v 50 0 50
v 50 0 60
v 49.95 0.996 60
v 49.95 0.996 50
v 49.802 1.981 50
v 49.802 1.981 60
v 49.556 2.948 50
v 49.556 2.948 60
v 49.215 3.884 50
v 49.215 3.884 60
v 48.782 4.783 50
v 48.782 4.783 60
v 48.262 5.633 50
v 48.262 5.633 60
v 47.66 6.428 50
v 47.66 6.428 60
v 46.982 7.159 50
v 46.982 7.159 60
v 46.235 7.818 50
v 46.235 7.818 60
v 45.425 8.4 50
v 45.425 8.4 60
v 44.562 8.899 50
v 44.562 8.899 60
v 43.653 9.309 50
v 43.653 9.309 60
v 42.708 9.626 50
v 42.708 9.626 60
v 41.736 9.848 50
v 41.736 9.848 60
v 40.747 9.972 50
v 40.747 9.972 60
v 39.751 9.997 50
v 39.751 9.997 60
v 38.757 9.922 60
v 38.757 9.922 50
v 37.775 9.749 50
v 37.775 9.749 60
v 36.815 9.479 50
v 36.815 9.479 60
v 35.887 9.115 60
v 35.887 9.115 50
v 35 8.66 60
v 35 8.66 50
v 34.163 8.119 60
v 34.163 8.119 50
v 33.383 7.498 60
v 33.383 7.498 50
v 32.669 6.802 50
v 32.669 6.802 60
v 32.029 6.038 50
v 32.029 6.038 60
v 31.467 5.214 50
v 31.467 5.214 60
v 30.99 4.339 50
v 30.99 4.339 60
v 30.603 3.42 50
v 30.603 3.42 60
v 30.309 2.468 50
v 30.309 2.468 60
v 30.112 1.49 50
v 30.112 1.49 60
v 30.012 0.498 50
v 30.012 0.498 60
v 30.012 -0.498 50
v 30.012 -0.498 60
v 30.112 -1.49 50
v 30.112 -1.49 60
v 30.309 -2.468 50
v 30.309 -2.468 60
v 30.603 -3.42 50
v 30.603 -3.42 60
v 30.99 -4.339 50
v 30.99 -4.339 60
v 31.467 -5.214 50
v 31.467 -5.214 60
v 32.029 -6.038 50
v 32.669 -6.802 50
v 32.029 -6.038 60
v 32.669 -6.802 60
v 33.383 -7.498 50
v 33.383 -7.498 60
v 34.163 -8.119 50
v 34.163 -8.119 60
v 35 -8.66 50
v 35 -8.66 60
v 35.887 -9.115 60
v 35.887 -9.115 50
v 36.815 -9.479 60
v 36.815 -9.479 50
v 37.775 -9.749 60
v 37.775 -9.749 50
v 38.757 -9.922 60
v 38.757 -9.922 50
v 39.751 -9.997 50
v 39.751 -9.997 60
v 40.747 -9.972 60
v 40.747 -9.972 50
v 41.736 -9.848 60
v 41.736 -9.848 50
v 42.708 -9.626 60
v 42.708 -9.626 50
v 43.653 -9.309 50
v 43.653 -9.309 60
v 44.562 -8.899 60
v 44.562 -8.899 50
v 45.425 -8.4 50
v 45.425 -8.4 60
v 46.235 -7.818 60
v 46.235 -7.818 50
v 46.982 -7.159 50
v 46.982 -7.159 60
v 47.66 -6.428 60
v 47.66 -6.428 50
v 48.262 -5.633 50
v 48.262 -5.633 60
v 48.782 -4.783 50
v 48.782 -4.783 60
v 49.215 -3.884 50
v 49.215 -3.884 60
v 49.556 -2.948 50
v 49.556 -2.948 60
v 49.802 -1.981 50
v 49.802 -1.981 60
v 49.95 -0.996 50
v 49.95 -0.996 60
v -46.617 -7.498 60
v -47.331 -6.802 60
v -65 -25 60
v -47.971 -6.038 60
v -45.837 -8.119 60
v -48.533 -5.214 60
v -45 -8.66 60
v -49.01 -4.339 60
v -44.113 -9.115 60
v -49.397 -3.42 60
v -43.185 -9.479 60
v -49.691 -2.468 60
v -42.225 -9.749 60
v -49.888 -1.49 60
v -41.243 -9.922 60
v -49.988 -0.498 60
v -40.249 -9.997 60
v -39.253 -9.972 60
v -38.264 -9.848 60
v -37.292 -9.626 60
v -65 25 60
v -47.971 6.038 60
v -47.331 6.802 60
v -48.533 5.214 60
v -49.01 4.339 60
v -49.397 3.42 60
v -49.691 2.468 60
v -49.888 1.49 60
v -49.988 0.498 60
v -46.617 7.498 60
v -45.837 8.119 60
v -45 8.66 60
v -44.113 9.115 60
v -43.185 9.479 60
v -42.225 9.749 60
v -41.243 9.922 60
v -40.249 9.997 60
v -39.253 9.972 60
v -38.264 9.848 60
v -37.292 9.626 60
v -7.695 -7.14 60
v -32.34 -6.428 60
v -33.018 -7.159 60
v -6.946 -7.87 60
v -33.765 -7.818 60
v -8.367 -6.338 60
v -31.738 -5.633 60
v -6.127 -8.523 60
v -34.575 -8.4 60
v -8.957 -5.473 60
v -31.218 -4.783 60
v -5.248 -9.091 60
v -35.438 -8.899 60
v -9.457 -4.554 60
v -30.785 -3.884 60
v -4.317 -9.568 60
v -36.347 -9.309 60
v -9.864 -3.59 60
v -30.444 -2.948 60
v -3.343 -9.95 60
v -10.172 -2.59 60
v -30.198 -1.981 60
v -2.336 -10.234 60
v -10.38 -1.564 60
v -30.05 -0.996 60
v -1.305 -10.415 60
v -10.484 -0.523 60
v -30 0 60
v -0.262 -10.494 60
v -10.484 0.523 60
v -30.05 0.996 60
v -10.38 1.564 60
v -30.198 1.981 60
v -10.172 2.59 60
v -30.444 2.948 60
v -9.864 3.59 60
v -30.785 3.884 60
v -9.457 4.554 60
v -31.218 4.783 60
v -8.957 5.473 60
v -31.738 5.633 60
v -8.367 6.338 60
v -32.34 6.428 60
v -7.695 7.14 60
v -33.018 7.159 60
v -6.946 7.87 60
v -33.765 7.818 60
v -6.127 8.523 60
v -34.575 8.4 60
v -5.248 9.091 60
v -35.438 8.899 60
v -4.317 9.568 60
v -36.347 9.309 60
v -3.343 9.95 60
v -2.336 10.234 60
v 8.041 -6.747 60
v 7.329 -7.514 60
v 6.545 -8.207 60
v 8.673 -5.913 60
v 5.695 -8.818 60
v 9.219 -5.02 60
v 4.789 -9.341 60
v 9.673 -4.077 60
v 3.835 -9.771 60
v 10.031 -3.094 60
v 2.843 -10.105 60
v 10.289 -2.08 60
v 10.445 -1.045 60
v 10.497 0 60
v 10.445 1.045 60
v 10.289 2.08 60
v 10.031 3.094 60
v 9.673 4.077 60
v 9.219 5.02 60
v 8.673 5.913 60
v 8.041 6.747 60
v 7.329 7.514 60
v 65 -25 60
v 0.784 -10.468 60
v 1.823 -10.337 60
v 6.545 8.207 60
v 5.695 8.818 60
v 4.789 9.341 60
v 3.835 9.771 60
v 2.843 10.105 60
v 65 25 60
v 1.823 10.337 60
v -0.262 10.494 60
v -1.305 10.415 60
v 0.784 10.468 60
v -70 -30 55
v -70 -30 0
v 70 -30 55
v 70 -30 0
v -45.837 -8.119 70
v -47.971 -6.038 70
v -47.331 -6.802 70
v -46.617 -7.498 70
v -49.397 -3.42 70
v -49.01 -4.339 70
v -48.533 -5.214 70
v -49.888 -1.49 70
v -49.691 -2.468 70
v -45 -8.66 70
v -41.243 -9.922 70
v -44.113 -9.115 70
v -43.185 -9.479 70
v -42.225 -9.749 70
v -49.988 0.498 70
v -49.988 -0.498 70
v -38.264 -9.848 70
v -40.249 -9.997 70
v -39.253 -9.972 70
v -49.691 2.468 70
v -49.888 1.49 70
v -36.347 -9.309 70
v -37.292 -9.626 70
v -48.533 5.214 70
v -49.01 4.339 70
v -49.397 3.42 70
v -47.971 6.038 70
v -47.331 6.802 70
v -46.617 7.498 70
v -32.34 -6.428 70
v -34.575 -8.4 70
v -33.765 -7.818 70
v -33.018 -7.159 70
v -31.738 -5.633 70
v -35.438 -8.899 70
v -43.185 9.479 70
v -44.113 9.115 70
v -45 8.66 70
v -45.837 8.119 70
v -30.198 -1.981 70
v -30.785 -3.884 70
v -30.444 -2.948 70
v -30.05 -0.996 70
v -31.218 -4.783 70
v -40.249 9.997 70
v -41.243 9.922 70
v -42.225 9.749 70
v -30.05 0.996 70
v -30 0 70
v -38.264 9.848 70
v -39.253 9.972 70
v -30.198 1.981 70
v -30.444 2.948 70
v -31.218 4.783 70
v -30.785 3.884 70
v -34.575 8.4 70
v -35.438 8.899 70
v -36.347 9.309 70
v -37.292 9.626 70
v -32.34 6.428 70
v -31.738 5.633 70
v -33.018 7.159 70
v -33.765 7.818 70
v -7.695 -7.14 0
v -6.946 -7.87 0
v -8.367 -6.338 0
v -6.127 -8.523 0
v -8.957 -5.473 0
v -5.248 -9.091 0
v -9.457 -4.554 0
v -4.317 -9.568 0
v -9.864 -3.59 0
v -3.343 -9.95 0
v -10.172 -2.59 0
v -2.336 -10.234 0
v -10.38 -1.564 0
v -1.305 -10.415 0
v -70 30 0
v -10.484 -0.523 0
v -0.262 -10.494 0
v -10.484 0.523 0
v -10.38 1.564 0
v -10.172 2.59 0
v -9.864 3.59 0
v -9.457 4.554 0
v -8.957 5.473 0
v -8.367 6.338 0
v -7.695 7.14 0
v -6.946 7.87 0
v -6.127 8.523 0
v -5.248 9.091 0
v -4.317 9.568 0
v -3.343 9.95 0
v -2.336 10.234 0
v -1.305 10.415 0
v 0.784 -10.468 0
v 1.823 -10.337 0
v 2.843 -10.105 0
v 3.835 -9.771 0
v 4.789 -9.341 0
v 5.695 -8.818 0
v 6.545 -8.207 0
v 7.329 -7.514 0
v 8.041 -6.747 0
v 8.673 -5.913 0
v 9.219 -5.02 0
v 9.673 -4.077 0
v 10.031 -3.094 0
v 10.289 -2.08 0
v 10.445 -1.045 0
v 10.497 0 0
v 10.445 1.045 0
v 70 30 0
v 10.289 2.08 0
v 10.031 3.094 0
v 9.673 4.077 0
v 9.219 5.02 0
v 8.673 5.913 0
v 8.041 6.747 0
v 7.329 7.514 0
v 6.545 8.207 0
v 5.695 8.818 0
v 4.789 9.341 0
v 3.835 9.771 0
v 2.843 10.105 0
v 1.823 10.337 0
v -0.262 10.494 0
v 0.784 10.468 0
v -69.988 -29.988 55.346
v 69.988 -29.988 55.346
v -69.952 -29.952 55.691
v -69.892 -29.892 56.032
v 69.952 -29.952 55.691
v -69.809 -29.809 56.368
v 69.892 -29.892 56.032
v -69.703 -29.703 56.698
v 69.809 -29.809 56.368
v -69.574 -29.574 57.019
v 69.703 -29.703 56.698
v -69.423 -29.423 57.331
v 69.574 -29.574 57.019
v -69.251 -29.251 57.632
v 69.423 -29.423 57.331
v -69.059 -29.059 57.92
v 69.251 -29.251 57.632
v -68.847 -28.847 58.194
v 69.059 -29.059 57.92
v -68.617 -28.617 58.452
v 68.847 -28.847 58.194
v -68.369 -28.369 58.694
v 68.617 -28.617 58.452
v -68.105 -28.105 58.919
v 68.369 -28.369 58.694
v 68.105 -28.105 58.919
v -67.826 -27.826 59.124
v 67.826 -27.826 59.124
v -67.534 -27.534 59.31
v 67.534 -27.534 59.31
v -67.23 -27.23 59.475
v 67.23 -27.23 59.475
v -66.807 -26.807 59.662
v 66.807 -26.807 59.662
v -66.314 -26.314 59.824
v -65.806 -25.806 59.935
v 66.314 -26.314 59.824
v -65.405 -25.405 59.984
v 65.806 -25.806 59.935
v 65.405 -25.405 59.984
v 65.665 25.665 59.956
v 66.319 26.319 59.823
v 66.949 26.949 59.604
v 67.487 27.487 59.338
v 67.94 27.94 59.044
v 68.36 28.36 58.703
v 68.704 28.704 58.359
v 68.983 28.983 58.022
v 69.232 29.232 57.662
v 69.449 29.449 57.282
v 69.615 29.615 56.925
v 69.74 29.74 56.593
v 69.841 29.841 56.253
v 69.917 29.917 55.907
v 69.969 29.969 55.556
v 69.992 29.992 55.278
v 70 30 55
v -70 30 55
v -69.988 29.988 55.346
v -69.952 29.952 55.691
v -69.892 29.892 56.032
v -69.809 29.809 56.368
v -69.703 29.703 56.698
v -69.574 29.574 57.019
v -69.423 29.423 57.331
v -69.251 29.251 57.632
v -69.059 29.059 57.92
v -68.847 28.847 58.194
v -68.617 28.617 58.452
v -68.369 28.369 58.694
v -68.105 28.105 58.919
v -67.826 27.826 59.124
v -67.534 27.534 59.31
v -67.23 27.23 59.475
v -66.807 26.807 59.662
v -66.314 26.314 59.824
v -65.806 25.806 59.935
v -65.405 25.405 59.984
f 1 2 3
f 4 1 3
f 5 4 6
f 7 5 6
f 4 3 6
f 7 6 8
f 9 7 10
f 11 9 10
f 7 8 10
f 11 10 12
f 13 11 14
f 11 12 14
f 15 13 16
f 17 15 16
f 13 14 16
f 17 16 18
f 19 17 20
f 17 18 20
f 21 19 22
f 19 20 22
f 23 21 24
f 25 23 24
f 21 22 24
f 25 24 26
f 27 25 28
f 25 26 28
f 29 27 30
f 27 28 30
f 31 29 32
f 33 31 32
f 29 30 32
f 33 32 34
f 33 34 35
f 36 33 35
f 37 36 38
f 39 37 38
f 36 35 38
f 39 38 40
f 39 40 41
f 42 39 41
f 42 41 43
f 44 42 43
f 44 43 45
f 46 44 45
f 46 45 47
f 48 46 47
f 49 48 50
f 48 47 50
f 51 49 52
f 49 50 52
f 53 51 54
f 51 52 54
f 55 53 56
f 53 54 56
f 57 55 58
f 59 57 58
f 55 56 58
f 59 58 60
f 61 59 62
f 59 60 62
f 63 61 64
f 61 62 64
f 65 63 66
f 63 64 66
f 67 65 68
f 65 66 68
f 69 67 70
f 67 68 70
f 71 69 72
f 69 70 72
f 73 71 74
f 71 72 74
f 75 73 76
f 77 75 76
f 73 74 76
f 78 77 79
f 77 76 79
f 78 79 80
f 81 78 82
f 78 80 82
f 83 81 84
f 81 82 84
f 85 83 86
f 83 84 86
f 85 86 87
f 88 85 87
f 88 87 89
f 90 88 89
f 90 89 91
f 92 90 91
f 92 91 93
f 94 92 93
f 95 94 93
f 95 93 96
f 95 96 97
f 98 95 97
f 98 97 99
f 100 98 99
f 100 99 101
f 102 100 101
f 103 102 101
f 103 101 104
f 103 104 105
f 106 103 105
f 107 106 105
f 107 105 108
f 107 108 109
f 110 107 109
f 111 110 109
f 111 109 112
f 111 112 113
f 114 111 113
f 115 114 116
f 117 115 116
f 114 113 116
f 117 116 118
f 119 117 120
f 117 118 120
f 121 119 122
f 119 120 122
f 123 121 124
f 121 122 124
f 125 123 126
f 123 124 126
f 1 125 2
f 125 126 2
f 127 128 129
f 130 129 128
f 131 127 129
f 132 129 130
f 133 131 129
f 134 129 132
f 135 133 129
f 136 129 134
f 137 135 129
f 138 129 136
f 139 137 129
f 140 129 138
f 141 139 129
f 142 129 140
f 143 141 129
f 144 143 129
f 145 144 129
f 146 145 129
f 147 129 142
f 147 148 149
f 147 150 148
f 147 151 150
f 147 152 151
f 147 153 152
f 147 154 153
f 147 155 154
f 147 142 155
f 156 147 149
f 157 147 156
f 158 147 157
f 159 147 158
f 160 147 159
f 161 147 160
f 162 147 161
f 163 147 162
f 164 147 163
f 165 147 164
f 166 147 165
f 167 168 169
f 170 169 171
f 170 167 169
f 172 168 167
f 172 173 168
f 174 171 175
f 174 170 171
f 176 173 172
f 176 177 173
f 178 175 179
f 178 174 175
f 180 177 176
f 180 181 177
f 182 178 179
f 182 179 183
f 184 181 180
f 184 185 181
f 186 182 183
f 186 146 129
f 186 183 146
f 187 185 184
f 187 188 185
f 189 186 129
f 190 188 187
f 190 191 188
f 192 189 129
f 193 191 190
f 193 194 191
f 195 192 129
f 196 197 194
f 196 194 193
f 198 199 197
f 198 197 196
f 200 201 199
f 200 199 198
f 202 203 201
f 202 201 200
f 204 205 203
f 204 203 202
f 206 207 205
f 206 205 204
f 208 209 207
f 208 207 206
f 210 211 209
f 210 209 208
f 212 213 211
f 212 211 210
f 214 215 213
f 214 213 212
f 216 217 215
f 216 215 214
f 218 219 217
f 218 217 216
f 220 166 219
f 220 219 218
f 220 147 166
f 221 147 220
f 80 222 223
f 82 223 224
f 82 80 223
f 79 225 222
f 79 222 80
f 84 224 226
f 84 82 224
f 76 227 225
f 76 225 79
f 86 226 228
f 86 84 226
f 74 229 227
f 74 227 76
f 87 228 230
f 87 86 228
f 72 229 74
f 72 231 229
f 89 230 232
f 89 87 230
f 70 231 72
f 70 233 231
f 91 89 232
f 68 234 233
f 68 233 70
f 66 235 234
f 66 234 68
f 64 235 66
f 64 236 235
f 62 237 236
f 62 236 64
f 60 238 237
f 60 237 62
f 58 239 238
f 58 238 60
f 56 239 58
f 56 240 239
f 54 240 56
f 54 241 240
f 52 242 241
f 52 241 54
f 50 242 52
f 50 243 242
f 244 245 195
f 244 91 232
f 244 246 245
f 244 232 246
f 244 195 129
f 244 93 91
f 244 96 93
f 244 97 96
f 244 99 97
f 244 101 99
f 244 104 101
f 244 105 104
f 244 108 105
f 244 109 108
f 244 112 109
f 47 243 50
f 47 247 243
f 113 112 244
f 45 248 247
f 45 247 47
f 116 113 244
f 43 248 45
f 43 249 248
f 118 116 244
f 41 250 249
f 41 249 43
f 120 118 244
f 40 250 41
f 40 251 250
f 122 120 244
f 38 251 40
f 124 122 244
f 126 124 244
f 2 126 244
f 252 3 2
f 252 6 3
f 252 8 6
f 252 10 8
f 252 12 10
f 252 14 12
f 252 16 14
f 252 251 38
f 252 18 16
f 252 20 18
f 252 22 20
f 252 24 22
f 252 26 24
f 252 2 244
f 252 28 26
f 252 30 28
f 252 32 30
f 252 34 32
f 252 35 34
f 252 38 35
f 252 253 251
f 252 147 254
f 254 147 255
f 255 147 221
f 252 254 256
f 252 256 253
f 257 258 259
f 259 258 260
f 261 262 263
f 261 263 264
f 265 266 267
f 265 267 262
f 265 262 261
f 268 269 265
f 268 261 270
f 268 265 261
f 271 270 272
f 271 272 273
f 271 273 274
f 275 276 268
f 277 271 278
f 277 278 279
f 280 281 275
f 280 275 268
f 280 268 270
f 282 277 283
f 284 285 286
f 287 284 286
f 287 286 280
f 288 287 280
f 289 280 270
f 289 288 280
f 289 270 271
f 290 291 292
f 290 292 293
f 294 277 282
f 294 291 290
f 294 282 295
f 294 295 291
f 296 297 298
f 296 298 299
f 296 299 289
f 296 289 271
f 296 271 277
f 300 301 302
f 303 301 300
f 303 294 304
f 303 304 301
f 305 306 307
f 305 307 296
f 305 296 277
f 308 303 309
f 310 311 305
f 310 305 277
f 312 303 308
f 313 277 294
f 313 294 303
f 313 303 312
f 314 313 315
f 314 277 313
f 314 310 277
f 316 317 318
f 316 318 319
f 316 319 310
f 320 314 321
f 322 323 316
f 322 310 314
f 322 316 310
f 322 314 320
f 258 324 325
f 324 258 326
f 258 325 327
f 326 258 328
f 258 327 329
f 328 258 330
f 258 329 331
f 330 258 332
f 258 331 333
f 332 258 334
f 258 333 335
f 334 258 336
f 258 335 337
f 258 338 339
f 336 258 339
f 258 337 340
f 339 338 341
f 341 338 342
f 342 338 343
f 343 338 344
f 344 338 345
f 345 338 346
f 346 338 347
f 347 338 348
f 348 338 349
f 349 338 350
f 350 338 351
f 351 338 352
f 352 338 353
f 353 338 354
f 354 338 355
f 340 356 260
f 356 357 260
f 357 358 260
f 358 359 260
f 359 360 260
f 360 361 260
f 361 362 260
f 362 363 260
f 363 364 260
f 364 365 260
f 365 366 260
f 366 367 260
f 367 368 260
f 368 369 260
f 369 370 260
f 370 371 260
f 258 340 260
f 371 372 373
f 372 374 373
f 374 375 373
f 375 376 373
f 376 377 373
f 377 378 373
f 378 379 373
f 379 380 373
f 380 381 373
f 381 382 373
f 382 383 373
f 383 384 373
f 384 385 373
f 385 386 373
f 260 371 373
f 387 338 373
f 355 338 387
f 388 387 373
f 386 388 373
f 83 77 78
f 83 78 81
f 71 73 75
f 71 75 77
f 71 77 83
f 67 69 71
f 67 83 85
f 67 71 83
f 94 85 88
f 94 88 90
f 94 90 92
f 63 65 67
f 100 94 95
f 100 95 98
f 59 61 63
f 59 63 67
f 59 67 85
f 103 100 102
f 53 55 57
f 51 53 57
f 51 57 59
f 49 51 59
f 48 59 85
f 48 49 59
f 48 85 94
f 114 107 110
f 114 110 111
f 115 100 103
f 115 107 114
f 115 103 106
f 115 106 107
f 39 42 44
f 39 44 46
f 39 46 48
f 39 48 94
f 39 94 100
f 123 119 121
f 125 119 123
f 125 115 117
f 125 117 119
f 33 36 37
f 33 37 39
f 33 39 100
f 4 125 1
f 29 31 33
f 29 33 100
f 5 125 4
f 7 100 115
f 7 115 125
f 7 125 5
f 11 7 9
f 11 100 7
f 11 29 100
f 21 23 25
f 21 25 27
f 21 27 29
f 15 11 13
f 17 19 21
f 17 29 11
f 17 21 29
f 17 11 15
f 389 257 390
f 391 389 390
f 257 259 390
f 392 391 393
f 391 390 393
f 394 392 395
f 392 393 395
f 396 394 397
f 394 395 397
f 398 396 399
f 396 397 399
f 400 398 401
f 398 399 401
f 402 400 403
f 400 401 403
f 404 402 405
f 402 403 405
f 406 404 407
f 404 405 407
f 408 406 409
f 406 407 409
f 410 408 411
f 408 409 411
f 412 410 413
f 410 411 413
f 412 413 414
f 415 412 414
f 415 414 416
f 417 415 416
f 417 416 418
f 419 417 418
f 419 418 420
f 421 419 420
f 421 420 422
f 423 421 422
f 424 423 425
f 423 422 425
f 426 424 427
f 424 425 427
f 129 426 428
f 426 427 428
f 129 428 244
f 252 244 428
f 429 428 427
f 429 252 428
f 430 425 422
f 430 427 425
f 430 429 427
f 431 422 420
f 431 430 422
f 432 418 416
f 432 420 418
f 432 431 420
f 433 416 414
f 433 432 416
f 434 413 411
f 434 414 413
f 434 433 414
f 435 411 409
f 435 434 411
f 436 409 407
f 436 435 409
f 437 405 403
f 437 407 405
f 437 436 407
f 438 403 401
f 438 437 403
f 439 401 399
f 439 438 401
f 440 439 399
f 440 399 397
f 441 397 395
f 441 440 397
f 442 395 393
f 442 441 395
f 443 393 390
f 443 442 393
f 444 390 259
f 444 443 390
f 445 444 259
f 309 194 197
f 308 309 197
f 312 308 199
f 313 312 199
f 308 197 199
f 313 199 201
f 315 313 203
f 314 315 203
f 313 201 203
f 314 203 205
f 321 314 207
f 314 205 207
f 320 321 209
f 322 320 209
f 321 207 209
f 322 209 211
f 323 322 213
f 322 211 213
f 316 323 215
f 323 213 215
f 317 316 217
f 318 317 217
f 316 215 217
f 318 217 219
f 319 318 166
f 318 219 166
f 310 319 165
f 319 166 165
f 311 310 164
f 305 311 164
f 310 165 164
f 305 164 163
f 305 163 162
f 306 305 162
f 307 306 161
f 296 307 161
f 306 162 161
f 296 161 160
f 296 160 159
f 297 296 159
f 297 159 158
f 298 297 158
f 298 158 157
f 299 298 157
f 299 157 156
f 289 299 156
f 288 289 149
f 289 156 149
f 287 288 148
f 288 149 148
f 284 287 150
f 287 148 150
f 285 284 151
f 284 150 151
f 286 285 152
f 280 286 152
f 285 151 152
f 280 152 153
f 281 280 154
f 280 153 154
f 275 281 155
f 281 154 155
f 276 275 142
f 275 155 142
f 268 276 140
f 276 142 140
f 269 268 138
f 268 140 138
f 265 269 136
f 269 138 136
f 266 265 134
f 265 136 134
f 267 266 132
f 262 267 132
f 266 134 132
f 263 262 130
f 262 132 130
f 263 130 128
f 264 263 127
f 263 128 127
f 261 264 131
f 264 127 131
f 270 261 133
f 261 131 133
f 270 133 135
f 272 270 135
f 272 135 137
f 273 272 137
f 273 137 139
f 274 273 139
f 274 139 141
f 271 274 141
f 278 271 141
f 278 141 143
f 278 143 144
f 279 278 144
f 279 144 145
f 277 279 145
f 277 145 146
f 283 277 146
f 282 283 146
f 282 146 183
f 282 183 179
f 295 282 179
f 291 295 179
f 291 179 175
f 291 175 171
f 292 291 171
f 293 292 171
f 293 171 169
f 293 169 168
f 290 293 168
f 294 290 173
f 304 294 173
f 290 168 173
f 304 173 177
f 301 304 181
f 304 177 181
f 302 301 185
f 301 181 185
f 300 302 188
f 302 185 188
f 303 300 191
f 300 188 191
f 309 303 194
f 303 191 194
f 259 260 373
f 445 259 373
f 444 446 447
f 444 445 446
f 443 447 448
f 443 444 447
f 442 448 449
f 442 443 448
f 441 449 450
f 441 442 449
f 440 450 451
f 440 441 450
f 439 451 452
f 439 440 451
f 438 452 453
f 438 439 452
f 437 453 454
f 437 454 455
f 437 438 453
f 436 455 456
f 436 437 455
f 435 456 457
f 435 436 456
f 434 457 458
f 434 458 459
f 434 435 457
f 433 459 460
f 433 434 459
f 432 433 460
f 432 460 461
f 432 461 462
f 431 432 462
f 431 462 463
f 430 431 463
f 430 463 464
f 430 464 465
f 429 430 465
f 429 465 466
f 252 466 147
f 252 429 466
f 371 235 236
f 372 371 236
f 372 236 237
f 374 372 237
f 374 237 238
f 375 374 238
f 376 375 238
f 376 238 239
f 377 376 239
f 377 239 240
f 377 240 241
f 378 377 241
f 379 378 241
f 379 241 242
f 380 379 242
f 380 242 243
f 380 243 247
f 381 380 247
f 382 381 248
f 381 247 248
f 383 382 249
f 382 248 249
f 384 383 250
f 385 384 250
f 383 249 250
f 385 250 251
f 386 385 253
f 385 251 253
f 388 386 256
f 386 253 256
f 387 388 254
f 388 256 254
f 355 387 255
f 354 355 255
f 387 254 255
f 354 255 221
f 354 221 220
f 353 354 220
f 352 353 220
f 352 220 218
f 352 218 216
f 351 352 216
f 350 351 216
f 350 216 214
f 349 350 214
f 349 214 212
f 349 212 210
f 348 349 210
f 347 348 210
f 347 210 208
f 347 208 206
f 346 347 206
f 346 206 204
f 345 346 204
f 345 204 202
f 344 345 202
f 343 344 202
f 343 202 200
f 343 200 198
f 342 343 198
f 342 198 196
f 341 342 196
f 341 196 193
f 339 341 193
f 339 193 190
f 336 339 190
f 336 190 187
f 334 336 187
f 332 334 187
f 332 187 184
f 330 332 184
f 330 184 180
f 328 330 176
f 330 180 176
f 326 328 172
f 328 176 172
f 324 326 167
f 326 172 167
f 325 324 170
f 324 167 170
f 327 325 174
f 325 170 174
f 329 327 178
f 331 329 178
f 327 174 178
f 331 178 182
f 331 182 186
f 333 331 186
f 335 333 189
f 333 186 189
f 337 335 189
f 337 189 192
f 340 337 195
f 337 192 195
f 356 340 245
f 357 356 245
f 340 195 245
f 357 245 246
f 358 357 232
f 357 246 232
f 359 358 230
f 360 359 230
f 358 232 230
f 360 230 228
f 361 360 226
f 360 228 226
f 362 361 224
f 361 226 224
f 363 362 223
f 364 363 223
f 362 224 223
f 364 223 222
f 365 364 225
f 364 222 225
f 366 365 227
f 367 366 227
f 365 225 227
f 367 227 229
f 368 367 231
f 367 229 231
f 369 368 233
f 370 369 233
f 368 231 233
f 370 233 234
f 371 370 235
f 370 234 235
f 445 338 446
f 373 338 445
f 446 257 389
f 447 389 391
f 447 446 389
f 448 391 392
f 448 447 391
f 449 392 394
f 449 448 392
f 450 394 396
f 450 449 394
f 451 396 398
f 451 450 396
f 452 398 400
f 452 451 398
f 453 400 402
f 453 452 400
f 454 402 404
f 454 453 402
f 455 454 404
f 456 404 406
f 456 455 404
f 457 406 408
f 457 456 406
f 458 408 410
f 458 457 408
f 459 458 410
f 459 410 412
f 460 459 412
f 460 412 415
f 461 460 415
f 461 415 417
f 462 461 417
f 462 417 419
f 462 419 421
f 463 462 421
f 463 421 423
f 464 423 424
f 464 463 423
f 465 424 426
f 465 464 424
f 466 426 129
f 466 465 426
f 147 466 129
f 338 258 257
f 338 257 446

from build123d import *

# Parameters (mm, degrees)
F0_W     = 140
F0_H     = 60
F1_DEPTH = 60
F2_R     = 10
F5_DEPTH = 10
F4_R     = 10.496877
F6_DEPTH = 69.2
F3_R     = 10
F7_DEPTH = 10
F8_R     = 5


with BuildPart() as f1:
    # F0 (on Top) → F1 (new body)
    with BuildSketch(Plane.XY):
        Rectangle(F0_W, F0_H)
    extrude(amount=F1_DEPTH)

    # F2 (on face) → F5 (join)
    with BuildSketch(Plane.XY.offset(60)):
        with Locations((-40, 0)):
            Circle(F2_R)
    extrude(amount=F5_DEPTH)

    # F4 (on face) → F6 (cut)
    with BuildSketch(Plane.XY.offset(60)):
        Circle(F4_R)
    extrude(amount=-F6_DEPTH, mode=Mode.SUBTRACT)

    # F3 (on face) → F7 (cut)
    with BuildSketch(Plane.XY.offset(60)):
        with Locations((40, 0)):
            Circle(F3_R)
    extrude(amount=-F7_DEPTH, mode=Mode.SUBTRACT)

    # F8
    f8_edges = [f1.edges().sort_by_distance(p)[0] for p in [
        (-70, 0, 60),
        (0, -30, 60),
        (70, 0, 60),
        (0, 30, 60),
    ]]
    fillet(f8_edges, radius=F8_R)


solid = f1.part
